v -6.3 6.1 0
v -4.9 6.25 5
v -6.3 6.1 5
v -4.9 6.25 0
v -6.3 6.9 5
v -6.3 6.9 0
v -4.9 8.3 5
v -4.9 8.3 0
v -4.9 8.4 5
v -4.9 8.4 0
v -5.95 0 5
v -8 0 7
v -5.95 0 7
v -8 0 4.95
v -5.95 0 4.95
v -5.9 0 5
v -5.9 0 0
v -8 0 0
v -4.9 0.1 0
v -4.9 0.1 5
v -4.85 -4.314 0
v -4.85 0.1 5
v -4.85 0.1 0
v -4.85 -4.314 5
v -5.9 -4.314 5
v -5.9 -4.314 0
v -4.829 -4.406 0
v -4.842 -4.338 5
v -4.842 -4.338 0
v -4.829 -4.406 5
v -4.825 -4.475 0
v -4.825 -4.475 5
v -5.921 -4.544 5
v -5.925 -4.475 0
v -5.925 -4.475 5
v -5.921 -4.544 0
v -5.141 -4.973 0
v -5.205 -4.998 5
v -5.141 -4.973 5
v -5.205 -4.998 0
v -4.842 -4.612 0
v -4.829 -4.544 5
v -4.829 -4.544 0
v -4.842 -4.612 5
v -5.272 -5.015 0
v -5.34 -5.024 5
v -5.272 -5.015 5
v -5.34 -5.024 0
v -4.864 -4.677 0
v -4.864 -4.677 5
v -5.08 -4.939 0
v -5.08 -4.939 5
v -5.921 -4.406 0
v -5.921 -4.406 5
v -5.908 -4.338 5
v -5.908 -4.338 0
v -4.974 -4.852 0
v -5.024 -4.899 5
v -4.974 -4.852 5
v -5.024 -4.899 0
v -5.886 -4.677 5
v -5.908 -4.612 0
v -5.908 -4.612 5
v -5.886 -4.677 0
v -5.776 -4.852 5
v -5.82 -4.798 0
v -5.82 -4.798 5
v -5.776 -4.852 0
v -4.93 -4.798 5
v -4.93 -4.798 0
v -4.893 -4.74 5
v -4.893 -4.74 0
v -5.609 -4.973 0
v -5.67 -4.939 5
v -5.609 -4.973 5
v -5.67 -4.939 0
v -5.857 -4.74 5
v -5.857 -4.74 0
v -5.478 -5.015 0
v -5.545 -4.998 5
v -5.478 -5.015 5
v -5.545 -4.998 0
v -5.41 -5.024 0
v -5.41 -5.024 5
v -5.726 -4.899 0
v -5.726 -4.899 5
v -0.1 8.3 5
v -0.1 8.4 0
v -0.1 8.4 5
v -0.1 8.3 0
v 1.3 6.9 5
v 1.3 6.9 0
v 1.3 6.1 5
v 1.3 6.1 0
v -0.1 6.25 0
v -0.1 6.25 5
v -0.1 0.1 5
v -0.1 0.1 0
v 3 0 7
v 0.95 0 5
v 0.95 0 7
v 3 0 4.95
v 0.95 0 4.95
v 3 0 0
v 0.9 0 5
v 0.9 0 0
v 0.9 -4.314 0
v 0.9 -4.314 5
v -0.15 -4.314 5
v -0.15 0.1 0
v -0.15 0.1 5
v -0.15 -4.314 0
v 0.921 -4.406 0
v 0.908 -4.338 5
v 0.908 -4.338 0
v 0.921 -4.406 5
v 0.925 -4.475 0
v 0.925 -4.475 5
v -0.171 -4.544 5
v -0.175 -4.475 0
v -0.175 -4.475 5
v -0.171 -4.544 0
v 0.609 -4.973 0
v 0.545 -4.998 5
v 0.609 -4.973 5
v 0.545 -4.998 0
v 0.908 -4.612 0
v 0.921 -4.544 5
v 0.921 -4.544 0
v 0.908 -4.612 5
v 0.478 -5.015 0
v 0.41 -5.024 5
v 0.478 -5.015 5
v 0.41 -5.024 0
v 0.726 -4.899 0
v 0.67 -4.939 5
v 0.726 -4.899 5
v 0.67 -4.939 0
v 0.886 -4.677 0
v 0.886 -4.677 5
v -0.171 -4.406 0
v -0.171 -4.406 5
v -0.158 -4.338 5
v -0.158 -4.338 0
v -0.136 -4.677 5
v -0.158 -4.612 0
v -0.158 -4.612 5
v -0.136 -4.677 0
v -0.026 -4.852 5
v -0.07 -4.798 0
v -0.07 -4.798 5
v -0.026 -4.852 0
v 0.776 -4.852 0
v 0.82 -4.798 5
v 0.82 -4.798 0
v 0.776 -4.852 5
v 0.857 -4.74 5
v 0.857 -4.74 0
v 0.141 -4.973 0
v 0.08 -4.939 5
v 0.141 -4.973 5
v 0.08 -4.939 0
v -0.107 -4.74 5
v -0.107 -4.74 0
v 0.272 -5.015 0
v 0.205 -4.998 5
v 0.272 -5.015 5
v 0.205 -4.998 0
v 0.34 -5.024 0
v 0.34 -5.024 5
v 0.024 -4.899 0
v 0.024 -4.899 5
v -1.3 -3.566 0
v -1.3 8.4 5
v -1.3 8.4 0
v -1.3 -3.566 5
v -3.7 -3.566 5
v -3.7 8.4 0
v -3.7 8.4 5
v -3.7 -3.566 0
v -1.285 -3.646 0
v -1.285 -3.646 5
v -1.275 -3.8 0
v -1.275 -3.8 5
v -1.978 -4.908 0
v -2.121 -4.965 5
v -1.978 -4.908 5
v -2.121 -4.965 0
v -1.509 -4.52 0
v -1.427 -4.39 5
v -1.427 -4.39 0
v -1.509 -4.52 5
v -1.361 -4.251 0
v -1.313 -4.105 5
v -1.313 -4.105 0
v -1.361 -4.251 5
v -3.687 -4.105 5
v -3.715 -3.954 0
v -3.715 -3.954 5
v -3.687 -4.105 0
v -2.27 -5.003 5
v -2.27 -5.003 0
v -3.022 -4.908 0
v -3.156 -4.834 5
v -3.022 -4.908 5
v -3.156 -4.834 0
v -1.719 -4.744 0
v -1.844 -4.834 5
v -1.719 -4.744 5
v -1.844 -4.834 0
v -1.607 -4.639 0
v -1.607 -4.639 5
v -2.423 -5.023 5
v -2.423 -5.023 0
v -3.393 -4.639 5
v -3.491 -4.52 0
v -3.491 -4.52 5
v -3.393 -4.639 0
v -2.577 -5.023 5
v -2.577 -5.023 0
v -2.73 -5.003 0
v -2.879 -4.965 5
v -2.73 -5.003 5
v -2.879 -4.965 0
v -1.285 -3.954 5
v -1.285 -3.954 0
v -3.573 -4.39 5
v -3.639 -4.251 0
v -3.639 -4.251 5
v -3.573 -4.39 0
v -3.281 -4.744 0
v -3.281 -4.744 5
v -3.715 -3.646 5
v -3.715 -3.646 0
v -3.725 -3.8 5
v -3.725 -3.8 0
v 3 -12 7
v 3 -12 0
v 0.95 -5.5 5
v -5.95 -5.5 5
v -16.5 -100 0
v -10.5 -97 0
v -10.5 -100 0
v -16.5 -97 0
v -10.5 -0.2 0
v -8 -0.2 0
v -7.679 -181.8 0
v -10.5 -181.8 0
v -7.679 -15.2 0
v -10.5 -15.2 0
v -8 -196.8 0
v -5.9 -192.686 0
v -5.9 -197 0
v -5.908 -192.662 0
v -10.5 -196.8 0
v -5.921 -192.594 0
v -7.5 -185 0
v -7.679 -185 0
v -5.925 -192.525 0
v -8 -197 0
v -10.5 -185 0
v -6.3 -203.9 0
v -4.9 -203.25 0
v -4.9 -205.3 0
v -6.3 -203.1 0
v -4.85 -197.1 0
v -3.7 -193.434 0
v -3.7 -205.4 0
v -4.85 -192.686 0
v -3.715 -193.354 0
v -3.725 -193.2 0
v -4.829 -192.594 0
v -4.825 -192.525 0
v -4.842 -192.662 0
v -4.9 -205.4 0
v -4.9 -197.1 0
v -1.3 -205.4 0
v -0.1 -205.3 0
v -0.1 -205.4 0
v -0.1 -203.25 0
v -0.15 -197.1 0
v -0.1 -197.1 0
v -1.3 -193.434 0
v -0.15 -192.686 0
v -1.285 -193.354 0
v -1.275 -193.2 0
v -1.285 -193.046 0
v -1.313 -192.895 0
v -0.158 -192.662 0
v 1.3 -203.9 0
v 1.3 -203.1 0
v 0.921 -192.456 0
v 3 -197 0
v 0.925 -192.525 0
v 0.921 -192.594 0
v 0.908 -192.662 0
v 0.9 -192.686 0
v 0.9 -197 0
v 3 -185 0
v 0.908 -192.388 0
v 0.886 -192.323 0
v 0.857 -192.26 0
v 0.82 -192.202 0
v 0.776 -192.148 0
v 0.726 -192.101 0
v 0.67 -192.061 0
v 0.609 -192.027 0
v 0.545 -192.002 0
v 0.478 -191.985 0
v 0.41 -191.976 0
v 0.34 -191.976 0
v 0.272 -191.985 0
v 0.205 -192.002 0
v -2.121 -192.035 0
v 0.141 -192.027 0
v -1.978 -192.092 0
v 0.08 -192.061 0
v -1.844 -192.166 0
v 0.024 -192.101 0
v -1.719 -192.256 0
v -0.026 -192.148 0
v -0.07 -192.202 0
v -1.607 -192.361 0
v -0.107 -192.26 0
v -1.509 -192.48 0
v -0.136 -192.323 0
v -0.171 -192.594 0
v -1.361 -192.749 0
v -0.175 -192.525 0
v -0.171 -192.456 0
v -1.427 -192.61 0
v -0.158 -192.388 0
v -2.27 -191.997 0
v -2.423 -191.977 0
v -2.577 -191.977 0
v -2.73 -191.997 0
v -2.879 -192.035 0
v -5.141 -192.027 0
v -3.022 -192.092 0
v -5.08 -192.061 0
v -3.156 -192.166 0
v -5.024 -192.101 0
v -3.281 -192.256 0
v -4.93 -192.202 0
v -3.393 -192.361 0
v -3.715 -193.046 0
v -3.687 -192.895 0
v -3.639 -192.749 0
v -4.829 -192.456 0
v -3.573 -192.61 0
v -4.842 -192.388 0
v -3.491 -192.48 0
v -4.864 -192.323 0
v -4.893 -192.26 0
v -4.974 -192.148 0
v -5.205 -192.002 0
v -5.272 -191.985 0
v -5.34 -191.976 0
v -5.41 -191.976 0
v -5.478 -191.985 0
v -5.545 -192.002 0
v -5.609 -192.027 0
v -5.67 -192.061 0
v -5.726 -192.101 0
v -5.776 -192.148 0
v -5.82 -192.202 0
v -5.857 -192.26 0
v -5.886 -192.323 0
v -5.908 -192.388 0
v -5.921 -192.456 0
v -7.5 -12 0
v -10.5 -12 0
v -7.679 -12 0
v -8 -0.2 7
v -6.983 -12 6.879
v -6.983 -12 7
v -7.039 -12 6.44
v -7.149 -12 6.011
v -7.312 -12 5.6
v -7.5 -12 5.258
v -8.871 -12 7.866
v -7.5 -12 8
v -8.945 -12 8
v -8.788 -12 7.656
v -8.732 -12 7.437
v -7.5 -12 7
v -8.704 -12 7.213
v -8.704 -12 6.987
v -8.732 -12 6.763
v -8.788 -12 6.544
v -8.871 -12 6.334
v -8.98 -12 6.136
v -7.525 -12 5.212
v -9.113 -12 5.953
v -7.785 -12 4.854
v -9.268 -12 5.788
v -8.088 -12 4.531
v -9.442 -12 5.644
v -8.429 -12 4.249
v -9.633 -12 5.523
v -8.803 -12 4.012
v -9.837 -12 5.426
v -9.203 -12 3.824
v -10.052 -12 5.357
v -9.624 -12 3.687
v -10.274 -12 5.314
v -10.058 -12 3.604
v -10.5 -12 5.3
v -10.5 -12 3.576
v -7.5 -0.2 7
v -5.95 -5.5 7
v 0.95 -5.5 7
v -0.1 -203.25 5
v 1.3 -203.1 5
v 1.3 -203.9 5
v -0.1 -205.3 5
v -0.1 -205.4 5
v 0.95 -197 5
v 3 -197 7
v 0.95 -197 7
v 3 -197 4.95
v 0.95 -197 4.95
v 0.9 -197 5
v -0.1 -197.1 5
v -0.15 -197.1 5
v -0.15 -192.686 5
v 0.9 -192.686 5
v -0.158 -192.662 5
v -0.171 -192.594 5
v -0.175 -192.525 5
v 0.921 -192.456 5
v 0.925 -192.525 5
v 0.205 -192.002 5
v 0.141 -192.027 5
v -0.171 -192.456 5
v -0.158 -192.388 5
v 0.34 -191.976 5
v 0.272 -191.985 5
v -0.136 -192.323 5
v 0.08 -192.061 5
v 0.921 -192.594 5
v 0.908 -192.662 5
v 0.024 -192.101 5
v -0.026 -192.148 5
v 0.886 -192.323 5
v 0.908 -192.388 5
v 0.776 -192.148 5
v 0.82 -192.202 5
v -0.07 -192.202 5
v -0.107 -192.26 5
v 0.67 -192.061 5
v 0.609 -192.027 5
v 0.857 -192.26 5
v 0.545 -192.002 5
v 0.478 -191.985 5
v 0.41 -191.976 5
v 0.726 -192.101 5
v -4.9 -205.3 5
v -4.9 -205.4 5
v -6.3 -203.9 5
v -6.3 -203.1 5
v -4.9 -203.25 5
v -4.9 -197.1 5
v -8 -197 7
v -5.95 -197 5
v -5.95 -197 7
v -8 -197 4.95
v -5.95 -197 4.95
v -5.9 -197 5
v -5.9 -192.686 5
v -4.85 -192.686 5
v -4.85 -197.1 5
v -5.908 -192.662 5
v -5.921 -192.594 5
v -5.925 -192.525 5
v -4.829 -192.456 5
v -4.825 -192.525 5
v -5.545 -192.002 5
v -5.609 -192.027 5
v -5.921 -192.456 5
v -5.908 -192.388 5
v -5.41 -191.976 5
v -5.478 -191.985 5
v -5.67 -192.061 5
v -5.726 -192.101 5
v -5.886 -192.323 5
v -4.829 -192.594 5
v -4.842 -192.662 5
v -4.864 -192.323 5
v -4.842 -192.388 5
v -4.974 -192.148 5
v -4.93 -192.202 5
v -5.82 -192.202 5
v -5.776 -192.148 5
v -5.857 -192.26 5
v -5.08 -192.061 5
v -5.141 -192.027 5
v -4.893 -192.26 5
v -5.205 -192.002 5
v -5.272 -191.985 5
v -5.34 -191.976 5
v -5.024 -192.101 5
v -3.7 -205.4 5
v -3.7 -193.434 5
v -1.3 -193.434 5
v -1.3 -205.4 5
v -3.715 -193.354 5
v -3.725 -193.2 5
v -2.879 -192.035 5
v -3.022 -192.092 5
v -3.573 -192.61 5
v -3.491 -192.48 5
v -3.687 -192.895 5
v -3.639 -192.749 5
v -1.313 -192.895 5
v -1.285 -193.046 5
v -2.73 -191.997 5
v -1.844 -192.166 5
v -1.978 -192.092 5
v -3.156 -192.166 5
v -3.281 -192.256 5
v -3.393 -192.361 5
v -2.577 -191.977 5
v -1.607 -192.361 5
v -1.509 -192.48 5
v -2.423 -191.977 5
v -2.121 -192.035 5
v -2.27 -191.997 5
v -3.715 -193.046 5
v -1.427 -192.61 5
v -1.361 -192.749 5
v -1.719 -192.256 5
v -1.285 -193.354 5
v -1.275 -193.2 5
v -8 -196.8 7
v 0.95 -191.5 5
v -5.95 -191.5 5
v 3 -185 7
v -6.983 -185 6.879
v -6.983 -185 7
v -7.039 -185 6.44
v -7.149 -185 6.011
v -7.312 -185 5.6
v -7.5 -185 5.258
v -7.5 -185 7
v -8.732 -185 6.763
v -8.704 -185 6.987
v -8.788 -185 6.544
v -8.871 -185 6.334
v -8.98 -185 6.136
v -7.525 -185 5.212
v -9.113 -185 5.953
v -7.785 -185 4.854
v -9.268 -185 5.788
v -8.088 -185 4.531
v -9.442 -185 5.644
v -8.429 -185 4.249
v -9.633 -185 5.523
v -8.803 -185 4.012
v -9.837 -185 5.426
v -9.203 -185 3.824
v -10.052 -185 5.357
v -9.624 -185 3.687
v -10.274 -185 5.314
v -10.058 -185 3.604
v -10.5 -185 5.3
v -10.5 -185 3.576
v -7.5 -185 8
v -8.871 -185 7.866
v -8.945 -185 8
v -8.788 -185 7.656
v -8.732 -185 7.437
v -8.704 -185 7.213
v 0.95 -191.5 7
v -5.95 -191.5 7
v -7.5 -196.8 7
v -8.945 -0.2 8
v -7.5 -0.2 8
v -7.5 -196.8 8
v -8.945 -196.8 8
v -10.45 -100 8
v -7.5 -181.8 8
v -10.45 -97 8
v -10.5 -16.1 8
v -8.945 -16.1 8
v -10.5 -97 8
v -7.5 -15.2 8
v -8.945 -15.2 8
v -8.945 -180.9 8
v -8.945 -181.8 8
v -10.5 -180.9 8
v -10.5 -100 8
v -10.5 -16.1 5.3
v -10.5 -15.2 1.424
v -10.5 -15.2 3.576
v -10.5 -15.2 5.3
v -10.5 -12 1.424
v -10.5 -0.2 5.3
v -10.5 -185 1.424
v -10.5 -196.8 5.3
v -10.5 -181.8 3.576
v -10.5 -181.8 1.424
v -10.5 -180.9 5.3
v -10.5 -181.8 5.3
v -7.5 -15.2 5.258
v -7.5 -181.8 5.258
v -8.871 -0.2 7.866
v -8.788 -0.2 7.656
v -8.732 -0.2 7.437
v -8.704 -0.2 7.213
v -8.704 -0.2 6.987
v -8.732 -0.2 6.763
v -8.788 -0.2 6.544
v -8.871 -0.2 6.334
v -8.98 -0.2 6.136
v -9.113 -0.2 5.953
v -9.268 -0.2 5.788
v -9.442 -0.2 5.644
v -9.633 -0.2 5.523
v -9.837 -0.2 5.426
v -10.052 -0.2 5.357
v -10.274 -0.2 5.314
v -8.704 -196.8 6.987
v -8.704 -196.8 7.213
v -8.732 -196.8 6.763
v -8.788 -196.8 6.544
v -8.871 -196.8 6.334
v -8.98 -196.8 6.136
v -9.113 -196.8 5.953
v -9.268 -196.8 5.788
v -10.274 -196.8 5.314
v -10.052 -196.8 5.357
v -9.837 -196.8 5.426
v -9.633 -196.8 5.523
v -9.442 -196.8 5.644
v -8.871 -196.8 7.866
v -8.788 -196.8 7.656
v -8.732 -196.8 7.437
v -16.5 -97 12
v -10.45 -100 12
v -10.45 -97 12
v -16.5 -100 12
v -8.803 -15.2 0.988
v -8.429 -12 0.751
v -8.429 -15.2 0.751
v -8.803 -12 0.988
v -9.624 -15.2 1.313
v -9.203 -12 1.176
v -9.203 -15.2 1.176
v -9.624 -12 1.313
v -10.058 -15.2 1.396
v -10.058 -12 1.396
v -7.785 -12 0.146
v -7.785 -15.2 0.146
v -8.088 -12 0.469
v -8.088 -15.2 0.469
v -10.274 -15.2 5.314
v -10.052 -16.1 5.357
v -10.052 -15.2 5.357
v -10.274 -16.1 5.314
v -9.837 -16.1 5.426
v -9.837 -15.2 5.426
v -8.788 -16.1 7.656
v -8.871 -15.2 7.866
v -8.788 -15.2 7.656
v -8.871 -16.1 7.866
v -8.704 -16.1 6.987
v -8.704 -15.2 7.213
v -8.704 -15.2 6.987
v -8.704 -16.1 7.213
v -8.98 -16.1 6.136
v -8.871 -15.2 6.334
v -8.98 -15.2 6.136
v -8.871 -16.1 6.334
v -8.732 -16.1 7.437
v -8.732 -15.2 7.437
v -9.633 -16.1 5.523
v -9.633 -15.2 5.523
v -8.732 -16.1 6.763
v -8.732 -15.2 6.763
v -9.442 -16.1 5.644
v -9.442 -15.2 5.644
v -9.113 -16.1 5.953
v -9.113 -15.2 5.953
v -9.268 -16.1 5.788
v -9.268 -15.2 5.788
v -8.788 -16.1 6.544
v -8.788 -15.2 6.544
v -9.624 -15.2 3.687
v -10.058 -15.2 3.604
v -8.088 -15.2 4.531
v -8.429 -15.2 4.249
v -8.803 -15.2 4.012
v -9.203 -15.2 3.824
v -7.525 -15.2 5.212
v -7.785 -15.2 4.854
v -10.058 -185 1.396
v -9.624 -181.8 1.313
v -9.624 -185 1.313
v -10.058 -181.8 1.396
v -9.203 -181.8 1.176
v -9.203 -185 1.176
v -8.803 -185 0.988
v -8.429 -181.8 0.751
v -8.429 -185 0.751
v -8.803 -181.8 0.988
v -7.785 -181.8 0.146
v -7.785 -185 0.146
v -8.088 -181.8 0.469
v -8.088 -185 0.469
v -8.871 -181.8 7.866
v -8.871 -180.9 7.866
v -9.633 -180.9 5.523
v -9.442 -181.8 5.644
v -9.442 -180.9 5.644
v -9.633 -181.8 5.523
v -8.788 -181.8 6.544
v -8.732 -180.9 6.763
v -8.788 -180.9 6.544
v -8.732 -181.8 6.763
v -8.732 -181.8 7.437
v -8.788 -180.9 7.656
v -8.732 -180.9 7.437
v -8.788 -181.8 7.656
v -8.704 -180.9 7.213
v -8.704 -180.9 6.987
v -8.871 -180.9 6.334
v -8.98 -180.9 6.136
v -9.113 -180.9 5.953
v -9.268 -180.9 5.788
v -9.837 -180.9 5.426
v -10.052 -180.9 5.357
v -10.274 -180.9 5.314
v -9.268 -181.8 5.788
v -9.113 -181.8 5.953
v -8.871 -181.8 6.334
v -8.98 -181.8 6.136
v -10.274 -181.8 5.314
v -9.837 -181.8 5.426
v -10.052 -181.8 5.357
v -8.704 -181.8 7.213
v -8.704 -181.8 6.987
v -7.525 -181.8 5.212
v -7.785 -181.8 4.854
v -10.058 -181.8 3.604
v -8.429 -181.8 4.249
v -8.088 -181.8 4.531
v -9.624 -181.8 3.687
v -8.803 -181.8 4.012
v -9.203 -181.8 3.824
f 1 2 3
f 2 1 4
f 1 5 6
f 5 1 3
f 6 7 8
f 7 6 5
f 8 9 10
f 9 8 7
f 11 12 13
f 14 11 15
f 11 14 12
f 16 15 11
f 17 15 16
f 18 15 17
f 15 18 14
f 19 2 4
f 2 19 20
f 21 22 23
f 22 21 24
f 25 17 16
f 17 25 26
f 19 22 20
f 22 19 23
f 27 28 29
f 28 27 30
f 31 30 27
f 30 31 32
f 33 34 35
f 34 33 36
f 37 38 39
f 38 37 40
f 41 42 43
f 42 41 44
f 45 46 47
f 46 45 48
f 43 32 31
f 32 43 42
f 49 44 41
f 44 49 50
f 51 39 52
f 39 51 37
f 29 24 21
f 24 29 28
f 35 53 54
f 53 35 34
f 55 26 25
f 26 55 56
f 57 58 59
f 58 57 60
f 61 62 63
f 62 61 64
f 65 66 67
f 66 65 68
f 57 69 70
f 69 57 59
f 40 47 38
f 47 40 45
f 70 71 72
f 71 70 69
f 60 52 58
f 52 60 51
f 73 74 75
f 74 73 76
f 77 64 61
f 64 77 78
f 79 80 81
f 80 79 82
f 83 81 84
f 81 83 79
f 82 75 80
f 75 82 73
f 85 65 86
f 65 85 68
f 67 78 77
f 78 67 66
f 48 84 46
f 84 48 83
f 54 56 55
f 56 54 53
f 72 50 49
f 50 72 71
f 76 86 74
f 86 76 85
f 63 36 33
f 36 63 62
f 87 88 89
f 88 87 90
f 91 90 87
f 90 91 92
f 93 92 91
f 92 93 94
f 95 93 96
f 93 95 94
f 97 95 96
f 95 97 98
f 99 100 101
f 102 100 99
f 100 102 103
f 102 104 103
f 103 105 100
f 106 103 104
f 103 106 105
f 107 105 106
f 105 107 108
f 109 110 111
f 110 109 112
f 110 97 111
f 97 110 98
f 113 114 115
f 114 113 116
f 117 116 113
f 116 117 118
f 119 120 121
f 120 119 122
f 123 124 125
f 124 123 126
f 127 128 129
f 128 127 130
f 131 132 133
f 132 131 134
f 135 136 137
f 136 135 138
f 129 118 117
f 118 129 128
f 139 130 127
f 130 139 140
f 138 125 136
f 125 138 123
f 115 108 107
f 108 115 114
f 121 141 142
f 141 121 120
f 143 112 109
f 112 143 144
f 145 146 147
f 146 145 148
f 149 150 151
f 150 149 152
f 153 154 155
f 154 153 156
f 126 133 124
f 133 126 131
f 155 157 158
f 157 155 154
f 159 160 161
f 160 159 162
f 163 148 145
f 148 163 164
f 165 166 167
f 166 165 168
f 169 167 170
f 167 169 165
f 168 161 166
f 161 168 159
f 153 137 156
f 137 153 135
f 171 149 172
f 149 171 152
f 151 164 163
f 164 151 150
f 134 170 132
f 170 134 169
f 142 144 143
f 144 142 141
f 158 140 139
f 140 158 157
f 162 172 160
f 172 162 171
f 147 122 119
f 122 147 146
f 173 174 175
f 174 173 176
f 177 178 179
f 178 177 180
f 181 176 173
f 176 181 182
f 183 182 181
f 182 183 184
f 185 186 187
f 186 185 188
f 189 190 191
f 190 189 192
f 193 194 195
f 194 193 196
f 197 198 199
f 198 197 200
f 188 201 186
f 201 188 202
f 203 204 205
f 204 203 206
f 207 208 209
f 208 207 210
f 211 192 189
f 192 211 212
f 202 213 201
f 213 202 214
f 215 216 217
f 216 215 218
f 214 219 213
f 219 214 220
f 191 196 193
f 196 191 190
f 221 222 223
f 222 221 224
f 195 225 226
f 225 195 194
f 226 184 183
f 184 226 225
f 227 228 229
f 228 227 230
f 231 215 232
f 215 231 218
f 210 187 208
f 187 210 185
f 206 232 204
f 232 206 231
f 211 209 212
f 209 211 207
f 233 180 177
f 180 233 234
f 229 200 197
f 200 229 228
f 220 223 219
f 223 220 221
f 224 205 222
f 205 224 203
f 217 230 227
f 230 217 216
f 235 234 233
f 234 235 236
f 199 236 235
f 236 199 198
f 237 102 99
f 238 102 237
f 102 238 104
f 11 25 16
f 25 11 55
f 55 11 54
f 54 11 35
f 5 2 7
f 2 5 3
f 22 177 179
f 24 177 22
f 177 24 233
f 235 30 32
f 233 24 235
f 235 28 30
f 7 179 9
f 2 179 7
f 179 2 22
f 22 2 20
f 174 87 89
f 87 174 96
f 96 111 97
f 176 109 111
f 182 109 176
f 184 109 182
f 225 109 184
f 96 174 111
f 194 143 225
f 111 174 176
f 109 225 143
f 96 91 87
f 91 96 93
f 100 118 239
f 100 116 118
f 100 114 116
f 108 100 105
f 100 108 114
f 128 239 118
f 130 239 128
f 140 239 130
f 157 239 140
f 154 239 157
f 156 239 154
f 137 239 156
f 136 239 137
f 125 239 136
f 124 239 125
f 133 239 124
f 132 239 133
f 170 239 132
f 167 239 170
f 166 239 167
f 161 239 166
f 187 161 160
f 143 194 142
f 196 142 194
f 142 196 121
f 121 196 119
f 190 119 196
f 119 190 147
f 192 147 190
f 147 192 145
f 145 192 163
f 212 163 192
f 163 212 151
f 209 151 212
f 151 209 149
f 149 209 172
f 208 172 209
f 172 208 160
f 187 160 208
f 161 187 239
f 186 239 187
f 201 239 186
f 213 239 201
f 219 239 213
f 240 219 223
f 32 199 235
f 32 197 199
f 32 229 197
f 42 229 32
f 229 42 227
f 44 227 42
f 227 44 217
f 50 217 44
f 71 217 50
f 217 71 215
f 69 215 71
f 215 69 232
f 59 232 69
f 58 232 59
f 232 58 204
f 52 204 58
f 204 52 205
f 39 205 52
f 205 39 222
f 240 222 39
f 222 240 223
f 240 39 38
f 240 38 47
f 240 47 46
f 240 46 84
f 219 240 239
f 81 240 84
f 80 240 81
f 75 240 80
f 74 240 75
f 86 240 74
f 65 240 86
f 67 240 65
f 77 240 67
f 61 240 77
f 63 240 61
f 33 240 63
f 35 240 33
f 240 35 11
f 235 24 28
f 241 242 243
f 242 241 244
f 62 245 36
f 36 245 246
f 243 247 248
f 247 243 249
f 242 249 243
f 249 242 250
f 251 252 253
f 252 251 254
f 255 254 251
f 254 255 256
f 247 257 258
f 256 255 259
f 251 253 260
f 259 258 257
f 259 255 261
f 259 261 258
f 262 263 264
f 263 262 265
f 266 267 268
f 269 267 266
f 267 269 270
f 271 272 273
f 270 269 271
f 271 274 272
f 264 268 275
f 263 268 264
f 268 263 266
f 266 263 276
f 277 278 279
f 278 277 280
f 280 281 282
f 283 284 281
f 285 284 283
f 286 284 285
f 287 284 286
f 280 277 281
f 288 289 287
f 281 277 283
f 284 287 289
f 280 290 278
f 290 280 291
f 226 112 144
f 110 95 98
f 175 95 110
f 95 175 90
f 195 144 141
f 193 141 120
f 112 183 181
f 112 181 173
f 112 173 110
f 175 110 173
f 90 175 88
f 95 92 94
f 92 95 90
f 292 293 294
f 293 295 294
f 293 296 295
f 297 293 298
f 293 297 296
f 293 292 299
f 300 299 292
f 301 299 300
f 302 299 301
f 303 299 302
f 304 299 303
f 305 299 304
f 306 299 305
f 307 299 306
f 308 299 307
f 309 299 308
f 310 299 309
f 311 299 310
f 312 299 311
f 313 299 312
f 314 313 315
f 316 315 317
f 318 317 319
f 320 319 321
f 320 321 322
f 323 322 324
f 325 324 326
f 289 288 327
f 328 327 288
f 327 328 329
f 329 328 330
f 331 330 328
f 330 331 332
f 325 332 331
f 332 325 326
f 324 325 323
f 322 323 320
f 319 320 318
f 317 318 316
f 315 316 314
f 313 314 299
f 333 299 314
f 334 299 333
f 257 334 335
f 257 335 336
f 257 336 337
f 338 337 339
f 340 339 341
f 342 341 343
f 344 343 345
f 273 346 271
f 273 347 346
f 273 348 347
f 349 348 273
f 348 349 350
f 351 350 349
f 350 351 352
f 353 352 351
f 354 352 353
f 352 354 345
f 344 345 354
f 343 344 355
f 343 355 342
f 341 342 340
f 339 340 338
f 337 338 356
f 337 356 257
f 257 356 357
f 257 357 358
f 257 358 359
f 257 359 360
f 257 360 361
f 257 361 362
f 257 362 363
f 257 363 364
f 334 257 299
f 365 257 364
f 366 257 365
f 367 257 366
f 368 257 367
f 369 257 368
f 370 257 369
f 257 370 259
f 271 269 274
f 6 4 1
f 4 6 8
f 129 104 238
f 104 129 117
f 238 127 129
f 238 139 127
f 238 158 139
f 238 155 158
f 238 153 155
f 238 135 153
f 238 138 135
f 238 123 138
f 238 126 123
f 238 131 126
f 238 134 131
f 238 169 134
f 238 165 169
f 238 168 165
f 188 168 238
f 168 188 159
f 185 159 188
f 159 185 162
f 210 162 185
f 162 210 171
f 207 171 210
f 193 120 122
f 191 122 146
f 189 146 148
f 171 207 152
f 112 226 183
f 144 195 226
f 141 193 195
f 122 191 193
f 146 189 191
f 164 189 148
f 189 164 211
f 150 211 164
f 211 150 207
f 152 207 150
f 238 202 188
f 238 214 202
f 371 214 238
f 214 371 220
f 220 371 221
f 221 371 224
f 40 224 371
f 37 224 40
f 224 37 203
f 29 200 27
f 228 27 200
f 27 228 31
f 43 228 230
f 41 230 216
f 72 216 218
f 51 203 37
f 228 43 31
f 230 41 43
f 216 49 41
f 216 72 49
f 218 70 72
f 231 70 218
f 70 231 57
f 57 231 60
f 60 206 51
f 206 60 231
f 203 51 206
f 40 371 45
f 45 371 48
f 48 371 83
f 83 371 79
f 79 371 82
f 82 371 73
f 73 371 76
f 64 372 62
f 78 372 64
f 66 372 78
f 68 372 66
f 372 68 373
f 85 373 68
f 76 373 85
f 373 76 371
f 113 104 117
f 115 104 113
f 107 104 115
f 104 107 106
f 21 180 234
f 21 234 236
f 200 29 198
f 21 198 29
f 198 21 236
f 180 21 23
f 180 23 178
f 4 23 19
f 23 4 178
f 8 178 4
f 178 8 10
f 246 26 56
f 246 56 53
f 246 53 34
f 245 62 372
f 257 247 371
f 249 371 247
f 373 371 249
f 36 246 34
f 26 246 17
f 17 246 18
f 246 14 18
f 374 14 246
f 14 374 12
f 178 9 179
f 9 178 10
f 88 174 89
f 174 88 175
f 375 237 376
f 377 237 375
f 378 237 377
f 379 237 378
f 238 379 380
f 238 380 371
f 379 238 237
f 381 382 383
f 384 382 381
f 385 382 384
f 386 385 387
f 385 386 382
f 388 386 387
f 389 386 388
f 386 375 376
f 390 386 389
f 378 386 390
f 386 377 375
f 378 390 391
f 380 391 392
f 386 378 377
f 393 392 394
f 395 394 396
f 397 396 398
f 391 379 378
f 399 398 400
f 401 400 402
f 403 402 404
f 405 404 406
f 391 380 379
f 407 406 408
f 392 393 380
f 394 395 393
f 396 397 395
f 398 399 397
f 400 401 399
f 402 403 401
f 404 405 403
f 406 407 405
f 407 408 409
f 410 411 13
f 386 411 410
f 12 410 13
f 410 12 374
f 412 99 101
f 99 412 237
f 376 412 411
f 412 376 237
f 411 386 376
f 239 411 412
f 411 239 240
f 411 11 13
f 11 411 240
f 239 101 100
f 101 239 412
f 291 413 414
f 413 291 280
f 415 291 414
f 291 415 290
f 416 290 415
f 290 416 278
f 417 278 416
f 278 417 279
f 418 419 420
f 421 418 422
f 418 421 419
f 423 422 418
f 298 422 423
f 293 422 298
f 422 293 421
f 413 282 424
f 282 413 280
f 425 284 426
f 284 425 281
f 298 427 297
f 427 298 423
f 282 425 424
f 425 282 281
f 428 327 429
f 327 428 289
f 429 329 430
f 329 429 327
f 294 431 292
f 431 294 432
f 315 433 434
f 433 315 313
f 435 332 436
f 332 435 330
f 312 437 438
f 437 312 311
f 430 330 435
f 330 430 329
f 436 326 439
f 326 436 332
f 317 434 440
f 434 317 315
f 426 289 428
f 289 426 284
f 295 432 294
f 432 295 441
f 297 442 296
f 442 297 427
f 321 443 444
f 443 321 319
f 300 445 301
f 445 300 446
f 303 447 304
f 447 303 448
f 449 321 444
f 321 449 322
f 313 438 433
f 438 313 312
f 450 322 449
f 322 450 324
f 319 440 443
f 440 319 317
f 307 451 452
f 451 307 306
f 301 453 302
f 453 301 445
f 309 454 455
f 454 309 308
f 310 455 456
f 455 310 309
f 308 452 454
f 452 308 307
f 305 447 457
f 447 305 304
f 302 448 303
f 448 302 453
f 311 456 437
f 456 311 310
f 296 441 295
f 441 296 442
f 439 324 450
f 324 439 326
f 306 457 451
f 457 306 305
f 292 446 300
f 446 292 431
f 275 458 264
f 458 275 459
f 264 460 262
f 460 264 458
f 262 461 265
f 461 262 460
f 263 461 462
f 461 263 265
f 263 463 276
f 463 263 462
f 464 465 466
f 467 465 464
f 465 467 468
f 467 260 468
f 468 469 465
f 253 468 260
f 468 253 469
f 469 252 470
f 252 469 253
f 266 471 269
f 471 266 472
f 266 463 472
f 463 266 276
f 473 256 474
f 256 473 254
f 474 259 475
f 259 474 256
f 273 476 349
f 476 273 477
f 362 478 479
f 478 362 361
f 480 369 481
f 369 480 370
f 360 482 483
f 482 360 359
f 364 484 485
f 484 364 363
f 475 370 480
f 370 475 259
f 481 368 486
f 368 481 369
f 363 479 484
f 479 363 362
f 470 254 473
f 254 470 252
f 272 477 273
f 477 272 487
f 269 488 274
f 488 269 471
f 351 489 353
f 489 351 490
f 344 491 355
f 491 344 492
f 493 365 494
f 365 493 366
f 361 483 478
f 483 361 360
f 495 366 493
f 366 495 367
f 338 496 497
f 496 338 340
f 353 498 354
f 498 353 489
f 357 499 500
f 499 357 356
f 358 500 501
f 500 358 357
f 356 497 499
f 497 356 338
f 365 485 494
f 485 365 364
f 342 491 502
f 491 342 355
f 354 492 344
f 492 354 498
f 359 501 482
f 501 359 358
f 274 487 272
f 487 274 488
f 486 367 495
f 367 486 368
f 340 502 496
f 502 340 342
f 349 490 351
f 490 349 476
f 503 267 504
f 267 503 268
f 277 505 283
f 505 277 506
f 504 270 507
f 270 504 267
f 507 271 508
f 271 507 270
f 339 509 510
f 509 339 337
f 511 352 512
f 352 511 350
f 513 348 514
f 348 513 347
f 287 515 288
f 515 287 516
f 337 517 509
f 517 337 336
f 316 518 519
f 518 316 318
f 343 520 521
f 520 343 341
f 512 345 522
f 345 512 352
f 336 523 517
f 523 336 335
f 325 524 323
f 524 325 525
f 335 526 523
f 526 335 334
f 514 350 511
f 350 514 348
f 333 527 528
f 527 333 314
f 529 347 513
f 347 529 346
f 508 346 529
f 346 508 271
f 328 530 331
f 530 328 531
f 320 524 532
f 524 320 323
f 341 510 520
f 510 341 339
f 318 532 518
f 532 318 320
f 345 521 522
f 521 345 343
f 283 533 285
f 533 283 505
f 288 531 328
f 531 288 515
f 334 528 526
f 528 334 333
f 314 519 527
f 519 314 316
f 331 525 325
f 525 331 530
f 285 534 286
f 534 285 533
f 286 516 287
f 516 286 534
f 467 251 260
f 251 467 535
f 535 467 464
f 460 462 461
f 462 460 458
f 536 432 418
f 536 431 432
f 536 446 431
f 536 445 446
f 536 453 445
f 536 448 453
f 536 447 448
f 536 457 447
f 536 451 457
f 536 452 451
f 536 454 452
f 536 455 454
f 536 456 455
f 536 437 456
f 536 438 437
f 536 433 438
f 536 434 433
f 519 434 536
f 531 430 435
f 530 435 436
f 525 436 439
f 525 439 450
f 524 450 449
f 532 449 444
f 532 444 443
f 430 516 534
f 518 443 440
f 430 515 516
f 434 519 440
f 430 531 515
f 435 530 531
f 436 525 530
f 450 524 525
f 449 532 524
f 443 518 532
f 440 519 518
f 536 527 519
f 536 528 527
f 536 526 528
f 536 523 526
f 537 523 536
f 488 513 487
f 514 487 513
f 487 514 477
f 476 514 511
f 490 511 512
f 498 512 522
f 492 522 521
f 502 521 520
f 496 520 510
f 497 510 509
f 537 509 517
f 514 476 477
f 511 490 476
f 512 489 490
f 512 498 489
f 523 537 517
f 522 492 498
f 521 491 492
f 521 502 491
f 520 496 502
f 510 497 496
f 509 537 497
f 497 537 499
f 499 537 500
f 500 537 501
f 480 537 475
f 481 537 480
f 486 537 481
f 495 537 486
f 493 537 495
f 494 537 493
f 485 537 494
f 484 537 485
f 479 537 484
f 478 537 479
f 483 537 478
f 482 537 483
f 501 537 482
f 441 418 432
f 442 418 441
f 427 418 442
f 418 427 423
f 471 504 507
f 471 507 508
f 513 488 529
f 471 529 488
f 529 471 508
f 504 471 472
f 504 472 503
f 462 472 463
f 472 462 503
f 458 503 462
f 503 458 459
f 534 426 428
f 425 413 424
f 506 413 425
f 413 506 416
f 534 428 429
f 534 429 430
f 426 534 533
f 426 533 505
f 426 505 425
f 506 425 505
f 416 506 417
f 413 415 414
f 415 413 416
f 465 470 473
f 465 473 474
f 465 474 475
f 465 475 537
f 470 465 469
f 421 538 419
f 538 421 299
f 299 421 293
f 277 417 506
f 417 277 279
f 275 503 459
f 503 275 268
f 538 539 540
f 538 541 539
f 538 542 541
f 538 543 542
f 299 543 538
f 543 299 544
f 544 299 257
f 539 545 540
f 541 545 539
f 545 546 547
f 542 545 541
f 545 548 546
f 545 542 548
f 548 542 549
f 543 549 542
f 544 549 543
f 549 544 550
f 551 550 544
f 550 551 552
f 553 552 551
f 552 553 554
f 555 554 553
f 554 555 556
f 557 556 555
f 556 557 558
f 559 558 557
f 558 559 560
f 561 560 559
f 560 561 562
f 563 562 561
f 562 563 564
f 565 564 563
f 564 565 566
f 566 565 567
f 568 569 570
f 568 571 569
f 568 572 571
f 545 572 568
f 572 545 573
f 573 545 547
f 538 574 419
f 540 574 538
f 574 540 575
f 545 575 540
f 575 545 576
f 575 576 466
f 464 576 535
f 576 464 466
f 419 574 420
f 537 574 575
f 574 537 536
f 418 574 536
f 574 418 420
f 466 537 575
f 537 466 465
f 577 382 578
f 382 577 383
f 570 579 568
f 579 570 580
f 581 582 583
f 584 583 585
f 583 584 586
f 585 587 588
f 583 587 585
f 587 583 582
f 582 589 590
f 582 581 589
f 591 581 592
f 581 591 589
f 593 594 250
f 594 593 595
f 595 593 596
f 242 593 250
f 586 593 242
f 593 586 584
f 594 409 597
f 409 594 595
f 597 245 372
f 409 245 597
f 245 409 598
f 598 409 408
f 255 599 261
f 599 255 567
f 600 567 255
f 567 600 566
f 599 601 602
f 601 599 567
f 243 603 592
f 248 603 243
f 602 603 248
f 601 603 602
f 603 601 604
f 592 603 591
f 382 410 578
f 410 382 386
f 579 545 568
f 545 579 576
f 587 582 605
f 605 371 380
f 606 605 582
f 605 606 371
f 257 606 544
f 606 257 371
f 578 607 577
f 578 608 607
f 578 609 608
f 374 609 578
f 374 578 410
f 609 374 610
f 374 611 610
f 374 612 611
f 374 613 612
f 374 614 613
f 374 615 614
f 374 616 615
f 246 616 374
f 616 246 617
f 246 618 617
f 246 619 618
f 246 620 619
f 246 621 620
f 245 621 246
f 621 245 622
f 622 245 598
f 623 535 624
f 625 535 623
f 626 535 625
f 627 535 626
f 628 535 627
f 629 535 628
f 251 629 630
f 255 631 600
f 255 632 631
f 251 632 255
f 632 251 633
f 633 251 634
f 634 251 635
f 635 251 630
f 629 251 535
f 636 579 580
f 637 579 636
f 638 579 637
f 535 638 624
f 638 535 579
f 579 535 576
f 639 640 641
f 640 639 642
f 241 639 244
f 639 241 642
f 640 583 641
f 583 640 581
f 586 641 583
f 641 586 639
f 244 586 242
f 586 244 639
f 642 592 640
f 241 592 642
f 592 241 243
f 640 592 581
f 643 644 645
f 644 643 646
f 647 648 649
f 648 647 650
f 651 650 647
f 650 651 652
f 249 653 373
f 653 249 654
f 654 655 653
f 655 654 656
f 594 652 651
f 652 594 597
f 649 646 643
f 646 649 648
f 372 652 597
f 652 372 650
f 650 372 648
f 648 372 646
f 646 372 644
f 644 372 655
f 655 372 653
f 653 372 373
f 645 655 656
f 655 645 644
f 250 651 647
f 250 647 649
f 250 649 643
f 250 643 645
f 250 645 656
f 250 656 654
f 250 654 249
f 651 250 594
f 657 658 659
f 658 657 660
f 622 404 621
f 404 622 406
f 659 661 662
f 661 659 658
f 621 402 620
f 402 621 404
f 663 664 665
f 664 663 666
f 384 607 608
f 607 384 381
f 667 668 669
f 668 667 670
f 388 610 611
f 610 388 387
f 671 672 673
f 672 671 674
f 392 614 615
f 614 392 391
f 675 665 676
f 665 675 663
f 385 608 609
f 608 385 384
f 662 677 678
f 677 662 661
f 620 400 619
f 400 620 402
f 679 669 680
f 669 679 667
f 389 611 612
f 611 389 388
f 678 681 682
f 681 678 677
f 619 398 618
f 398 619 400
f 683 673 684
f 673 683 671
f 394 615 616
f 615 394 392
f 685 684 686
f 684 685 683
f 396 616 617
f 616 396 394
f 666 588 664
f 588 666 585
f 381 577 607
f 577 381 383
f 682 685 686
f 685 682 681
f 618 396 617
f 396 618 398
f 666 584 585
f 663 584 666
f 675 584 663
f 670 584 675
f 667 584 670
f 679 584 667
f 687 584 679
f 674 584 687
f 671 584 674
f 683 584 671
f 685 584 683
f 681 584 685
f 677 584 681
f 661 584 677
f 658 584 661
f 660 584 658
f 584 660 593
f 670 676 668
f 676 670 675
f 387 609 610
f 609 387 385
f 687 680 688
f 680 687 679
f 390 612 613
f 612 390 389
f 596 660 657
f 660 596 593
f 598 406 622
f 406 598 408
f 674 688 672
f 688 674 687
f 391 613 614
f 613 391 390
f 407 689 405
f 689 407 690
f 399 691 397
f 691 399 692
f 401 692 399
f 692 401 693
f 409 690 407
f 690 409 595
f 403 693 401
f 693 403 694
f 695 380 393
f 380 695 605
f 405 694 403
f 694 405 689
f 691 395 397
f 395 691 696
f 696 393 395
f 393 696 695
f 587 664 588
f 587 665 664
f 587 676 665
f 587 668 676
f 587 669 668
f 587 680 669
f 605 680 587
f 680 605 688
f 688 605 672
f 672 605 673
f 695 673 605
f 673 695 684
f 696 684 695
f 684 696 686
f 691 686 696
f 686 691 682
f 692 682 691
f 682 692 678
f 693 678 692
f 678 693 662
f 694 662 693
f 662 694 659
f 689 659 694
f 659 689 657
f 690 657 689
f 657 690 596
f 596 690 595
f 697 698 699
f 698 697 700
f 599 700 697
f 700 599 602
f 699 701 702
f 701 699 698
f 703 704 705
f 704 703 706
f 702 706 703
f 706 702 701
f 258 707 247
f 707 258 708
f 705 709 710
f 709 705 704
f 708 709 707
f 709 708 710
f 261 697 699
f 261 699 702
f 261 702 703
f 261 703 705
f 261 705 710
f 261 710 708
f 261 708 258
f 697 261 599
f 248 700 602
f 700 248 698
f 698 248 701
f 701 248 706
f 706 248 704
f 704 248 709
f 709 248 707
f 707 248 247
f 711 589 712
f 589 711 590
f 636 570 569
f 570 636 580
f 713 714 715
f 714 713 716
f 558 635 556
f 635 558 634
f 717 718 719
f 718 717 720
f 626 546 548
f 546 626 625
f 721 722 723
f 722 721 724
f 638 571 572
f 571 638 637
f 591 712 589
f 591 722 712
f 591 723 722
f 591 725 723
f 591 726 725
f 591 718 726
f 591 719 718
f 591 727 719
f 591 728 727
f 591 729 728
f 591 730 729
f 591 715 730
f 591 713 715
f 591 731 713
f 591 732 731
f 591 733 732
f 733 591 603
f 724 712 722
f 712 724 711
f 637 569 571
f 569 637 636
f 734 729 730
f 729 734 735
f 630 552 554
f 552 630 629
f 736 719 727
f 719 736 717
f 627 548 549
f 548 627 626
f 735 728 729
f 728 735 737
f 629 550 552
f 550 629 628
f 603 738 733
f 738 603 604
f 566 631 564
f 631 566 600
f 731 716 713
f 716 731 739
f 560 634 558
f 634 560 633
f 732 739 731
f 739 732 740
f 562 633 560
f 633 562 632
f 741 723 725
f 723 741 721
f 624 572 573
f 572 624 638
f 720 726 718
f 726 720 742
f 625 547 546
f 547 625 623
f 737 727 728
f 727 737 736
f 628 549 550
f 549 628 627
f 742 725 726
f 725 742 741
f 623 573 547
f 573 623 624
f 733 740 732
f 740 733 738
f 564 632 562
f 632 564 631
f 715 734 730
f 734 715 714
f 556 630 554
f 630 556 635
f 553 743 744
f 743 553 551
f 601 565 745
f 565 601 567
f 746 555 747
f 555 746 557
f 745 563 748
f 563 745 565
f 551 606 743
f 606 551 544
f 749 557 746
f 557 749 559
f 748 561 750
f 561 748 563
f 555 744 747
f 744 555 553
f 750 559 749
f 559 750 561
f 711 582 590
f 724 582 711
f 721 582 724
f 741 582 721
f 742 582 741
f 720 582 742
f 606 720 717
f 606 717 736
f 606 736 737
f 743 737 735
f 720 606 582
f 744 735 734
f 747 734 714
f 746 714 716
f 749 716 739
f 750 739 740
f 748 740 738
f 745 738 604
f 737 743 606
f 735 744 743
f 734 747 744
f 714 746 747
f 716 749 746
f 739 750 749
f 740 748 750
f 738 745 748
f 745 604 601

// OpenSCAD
$fn = 50;

difference() {
	union() {
		translate(v = [0, 0, 0]) {
			rotate(a = [0, 0, 0]) {
				difference() {
					union() {
						translate(v = [0, 0, 2.5]) {
							rotate(a = [0, -90, 0]) {
								difference() {
									union() {
										translate(v = [0, 0, 0]) {
											rotate(a = [0, 0, 0]) {
												difference() {
													union() {
														translate(v = [-2.5, 0, 2.5]) {
															rotate(a = [0, 90.0, 0]) {
																difference() {
																	union() {
																		translate(v = [0, 0, 0]) {
																			rotate(a = [0, 0, 0]) {
																				difference() {
																					union() {
																						translate(v = [0, 0, 0]) {
																							rotate(a = [0, 0, 0]) {
																								difference() {
																									union() {
																										translate(v = [-5.5, -12.0, 0]) {
																											cube(size = [11.0, 20.4, 5.0]);
																										}
																									}
																									union() {
																										translate(v = [0, 0, -0.1]) {
																											linear_extrude(height = 5.2) {
																												polygon(points = [[-2.4, 0], [-2.4, 6.25], [-3.8, 6.1], [-3.8, 6.8999999999999995], [-2.4, 8.299999999999999], [-2.4, 9.399999999999999], [-5.7, 9.399999999999999], [-5.7, 0]]);
																											}
																										}
																										translate(v = [0, 0, -0.1]) {
																											linear_extrude(height = 5.2) {
																												polygon(points = [[-2.35, -4.5], [-2.35, -4.3875], [-2.35, -4.275], [-2.35, -4.1625], [-2.35, -4.05], [-2.35, -3.9375], [-2.35, -3.825], [-2.35, -3.7125], [-2.35, -3.6], [-2.35, -3.4875], [-2.35, -3.375], [-2.35, -3.2625], [-2.35, -3.15], [-2.35, -3.0375], [-2.35, -2.925], [-2.35, -2.8125], [-2.35, -2.7], [-2.35, -2.5875], [-2.35, -2.475], [-2.35, -2.3625], [-2.35, -2.25], [-2.35, -2.1375], [-2.35, -2.025], [-2.35, -1.9125], [-2.35, -1.7999999999999998], [-2.35, -1.6875], [-2.35, -1.5750000000000002], [-2.35, -1.4625], [-2.35, -1.35], [-2.35, -1.2374999999999998], [-2.35, -1.125], [-2.35, -1.0125000000000002], [-2.35, -0.8999999999999999], [-2.35, -0.7875000000000001], [-2.35, -0.6749999999999998], [-2.35, -0.5625], [-2.35, -0.4500000000000002], [-2.35, -0.33750000000000036], [-2.35, -0.22499999999999964], [-2.35, -0.11249999999999982], [-2.35, 0.0], [-2.35, 0.1], [-3.4, 0.1], [-3.4, -4.5]]);
																											}
																										}
																										translate(v = [-2.875, -4.475, -0.1]) {
																											cylinder(h = 5.2, r = 0.55);
																										}
																										translate(v = [0, 0, -0.1]) {
																											linear_extrude(height = 5.2) {
																												polygon(points = [[2.4, 0], [2.4, 6.25], [3.8, 6.1], [3.8, 6.8999999999999995], [2.4, 8.299999999999999], [2.4, 9.399999999999999], [5.7, 9.399999999999999], [5.7, 0]]);
																											}
																										}
																										translate(v = [0, 0, -0.1]) {
																											linear_extrude(height = 5.2) {
																												polygon(points = [[2.35, -4.5], [2.35, -4.3875], [2.35, -4.275], [2.35, -4.1625], [2.35, -4.05], [2.35, -3.9375], [2.35, -3.825], [2.35, -3.7125], [2.35, -3.6], [2.35, -3.4875], [2.35, -3.375], [2.35, -3.2625], [2.35, -3.15], [2.35, -3.0375], [2.35, -2.925], [2.35, -2.8125], [2.35, -2.7], [2.35, -2.5875], [2.35, -2.475], [2.35, -2.3625], [2.35, -2.25], [2.35, -2.1375], [2.35, -2.025], [2.35, -1.9125], [2.35, -1.7999999999999998], [2.35, -1.6875], [2.35, -1.5750000000000002], [2.35, -1.4625], [2.35, -1.35], [2.35, -1.2374999999999998], [2.35, -1.125], [2.35, -1.0125000000000002], [2.35, -0.8999999999999999], [2.35, -0.7875000000000001], [2.35, -0.6749999999999998], [2.35, -0.5625], [2.35, -0.4500000000000002], [2.35, -0.33750000000000036], [2.35, -0.22499999999999964], [2.35, -0.11249999999999982], [2.35, 0.0], [2.35, 0.1], [3.4, 0.1], [3.4, -4.5]]);
																											}
																										}
																										translate(v = [2.875, -4.475, -0.1]) {
																											cylinder(h = 5.2, r = 0.55);
																										}
																										translate(v = [0, 0, -0.1]) {
																											linear_extrude(height = 5.2) {
																												polygon(points = [[-1.2, -3.8499999999999996], [-1.2, -3.6607142857142856], [-1.2, -3.471428571428571], [-1.2, -3.2821428571428566], [-1.2, -3.0928571428571425], [-1.2, -2.9035714285714285], [-1.2, -2.714285714285714], [-1.2, -2.5249999999999995], [-1.2, -2.3357142857142854], [-1.2, -2.1464285714285714], [-1.2, -1.9571428571428569], [-1.2, -1.7678571428571423], [-1.2, -1.5785714285714283], [-1.2, -1.3892857142857138], [-1.2, -1.1999999999999997], [-1.2, -1.0107142857142852], [-1.2, -0.8214285714285712], [-1.2, -0.6321428571428567], [-1.2, -0.4428571428571426], [-1.2, -0.2535714285714281], [-1.2, -0.06428571428571406], [-1.2, 0], [-1.2, 0.12500000000000044], [-1.2, 0.31428571428571495], [-1.2, 0.503571428571429], [-1.2, 0.6928571428571431], [-1.2, 0.8821428571428571], [-1.2, 1.071428571428572], [-1.2, 1.2607142857142861], [-1.2, 1.4500000000000002], [-1.2, 1.6392857142857142], [-1.2, 1.8285714285714292], [-1.2, 2.0178571428571432], [-1.2, 2.2071428571428573], [-1.2, 2.3964285714285714], [-1.2, 2.5857142857142863], [-1.2, 2.7750000000000004], [-1.2, 2.9642857142857144], [-1.2, 3.1535714285714294], [-1.2, 3.3428571428571434], [-1.2, 3.5321428571428575], [-1.2, 3.7214285714285715], [-1.2, 3.9107142857142865], [-1.2, 4.1000000000000005], [-1.2, 4.289285714285715], [-1.2, 4.4785714285714295], [-1.2, 4.667857142857143], [-1.2, 4.857142857142858], [-1.2, 5.046428571428573], [-1.2, 5.235714285714286], [-1.2, 5.425000000000001], [-1.2, 5.614285714285714], [-1.2, 5.803571428571429], [-1.2, 5.992857142857144], [-1.2, 6.1], [-1.2, 6.182142857142857], [-1.2, 6.25], [-1.2, 6.371428571428572], [-1.2, 6.560714285714287], [-1.2, 6.75], [-1.2, 6.939285714285715], [-1.2, 7.128571428571428], [-1.2, 7.317857142857143], [-1.2, 7.507142857142858], [-1.2, 7.696428571428571], [-1.2, 7.885714285714286], [-1.2, 8.075000000000001], [-1.2, 8.264285714285714], [-1.2, 8.45357142857143], [-1.2, 8.642857142857142], [-1.2, 8.832142857142857], [-1.2, 9.021428571428572], [-1.2, 9.210714285714285], [-1.2, 9.4], [1.2, 9.4], [1.2, 9.210714285714285], [1.2, 9.021428571428572], [1.2, 8.832142857142857], [1.2, 8.642857142857142], [1.2, 8.45357142857143], [1.2, 8.264285714285714], [1.2, 8.075000000000001], [1.2, 7.885714285714286], [1.2, 7.696428571428571], [1.2, 7.507142857142858], [1.2, 7.317857142857143], [1.2, 7.128571428571428], [1.2, 6.939285714285715], [1.2, 6.75], [1.2, 6.560714285714287], [1.2, 6.371428571428572], [1.2, 6.25], [1.2, 6.182142857142857], [1.2, 6.1], [1.2, 5.992857142857144], [1.2, 5.803571428571429], [1.2, 5.614285714285714], [1.2, 5.425000000000001], [1.2, 5.235714285714286], [1.2, 5.046428571428573], [1.2, 4.857142857142858], [1.2, 4.667857142857143], [1.2, 4.4785714285714295], [1.2, 4.289285714285715], [1.2, 4.1000000000000005], [1.2, 3.9107142857142865], [1.2, 3.7214285714285715], [1.2, 3.5321428571428575], [1.2, 3.3428571428571434], [1.2, 3.1535714285714294], [1.2, 2.9642857142857144], [1.2, 2.7750000000000004], [1.2, 2.5857142857142863], [1.2, 2.3964285714285714], [1.2, 2.2071428571428573], [1.2, 2.0178571428571432], [1.2, 1.8285714285714292], [1.2, 1.6392857142857142], [1.2, 1.4500000000000002], [1.2, 1.2607142857142861], [1.2, 1.071428571428572], [1.2, 0.8821428571428571], [1.2, 0.6928571428571431], [1.2, 0.503571428571429], [1.2, 0.31428571428571495], [1.2, 0.12500000000000044], [1.2, 0], [1.2, -0.06428571428571406], [1.2, -0.2535714285714281], [1.2, -0.4428571428571426], [1.2, -0.6321428571428567], [1.2, -0.8214285714285712], [1.2, -1.0107142857142852], [1.2, -1.1999999999999997], [1.2, -1.3892857142857138], [1.2, -1.5785714285714283], [1.2, -1.7678571428571423], [1.2, -1.9571428571428569], [1.2, -2.1464285714285714], [1.2, -2.3357142857142854], [1.2, -2.5249999999999995], [1.2, -2.714285714285714], [1.2, -2.9035714285714285], [1.2, -3.0928571428571425], [1.2, -3.2821428571428566], [1.2, -3.471428571428571], [1.2, -3.6607142857142856], [1.2, -3.8499999999999996]]);
																											}
																										}
																										translate(v = [0, -3.8, -0.1]) {
																											cylinder(h = 5.2, r = 1.2249999999999999);
																										}
																									}
																								}
																							}
																						}
																						translate(v = [0, 0, 0]) {
																							rotate(a = [0, 0, 0]) {
																								difference() {
																									union() {
																										translate(v = [-5.5, -12.0, 4.95]) {
																											cube(size = [11.0, 6.5, 2.05]);
																										}
																									}
																									union();
																								}
																							}
																						}
																						translate(v = [-5.5, -12.0, 4.95]) {
																							cube(size = [2.0500000000000003, 12.0, 2.05]);
																						}
																						translate(v = [3.4499999999999997, -12.0, 4.95]) {
																							cube(size = [2.0500000000000003, 12.0, 2.05]);
																						}
																					}
																					union();
																				}
																			}
																		}
																	}
																	union();
																}
															}
														}
													}
													union();
												}
											}
										}
										translate(v = [-2.5, -197.0, 2.5]) {
											rotate(a = [180, -90, 0]) {
												difference() {
													union() {
														translate(v = [0, 0, 0]) {
															rotate(a = [0, 0, 0]) {
																difference() {
																	union() {
																		translate(v = [0, 0, 0]) {
																			rotate(a = [0, 0, 0]) {
																				difference() {
																					union() {
																						translate(v = [-5.5, -12.0, 0]) {
																							cube(size = [11.0, 20.4, 5.0]);
																						}
																					}
																					union() {
																						translate(v = [0, 0, -0.1]) {
																							linear_extrude(height = 5.2) {
																								polygon(points = [[-2.4, 0], [-2.4, 6.25], [-3.8, 6.1], [-3.8, 6.8999999999999995], [-2.4, 8.299999999999999], [-2.4, 9.399999999999999], [-5.7, 9.399999999999999], [-5.7, 0]]);
																							}
																						}
																						translate(v = [0, 0, -0.1]) {
																							linear_extrude(height = 5.2) {
																								polygon(points = [[-2.35, -4.5], [-2.35, -4.3875], [-2.35, -4.275], [-2.35, -4.1625], [-2.35, -4.05], [-2.35, -3.9375], [-2.35, -3.825], [-2.35, -3.7125], [-2.35, -3.6], [-2.35, -3.4875], [-2.35, -3.375], [-2.35, -3.2625], [-2.35, -3.15], [-2.35, -3.0375], [-2.35, -2.925], [-2.35, -2.8125], [-2.35, -2.7], [-2.35, -2.5875], [-2.35, -2.475], [-2.35, -2.3625], [-2.35, -2.25], [-2.35, -2.1375], [-2.35, -2.025], [-2.35, -1.9125], [-2.35, -1.7999999999999998], [-2.35, -1.6875], [-2.35, -1.5750000000000002], [-2.35, -1.4625], [-2.35, -1.35], [-2.35, -1.2374999999999998], [-2.35, -1.125], [-2.35, -1.0125000000000002], [-2.35, -0.8999999999999999], [-2.35, -0.7875000000000001], [-2.35, -0.6749999999999998], [-2.35, -0.5625], [-2.35, -0.4500000000000002], [-2.35, -0.33750000000000036], [-2.35, -0.22499999999999964], [-2.35, -0.11249999999999982], [-2.35, 0.0], [-2.35, 0.1], [-3.4, 0.1], [-3.4, -4.5]]);
																							}
																						}
																						translate(v = [-2.875, -4.475, -0.1]) {
																							cylinder(h = 5.2, r = 0.55);
																						}
																						translate(v = [0, 0, -0.1]) {
																							linear_extrude(height = 5.2) {
																								polygon(points = [[2.4, 0], [2.4, 6.25], [3.8, 6.1], [3.8, 6.8999999999999995], [2.4, 8.299999999999999], [2.4, 9.399999999999999], [5.7, 9.399999999999999], [5.7, 0]]);
																							}
																						}
																						translate(v = [0, 0, -0.1]) {
																							linear_extrude(height = 5.2) {
																								polygon(points = [[2.35, -4.5], [2.35, -4.3875], [2.35, -4.275], [2.35, -4.1625], [2.35, -4.05], [2.35, -3.9375], [2.35, -3.825], [2.35, -3.7125], [2.35, -3.6], [2.35, -3.4875], [2.35, -3.375], [2.35, -3.2625], [2.35, -3.15], [2.35, -3.0375], [2.35, -2.925], [2.35, -2.8125], [2.35, -2.7], [2.35, -2.5875], [2.35, -2.475], [2.35, -2.3625], [2.35, -2.25], [2.35, -2.1375], [2.35, -2.025], [2.35, -1.9125], [2.35, -1.7999999999999998], [2.35, -1.6875], [2.35, -1.5750000000000002], [2.35, -1.4625], [2.35, -1.35], [2.35, -1.2374999999999998], [2.35, -1.125], [2.35, -1.0125000000000002], [2.35, -0.8999999999999999], [2.35, -0.7875000000000001], [2.35, -0.6749999999999998], [2.35, -0.5625], [2.35, -0.4500000000000002], [2.35, -0.33750000000000036], [2.35, -0.22499999999999964], [2.35, -0.11249999999999982], [2.35, 0.0], [2.35, 0.1], [3.4, 0.1], [3.4, -4.5]]);
																							}
																						}
																						translate(v = [2.875, -4.475, -0.1]) {
																							cylinder(h = 5.2, r = 0.55);
																						}
																						translate(v = [0, 0, -0.1]) {
																							linear_extrude(height = 5.2) {
																								polygon(points = [[-1.2, -3.8499999999999996], [-1.2, -3.6607142857142856], [-1.2, -3.471428571428571], [-1.2, -3.2821428571428566], [-1.2, -3.0928571428571425], [-1.2, -2.9035714285714285], [-1.2, -2.714285714285714], [-1.2, -2.5249999999999995], [-1.2, -2.3357142857142854], [-1.2, -2.1464285714285714], [-1.2, -1.9571428571428569], [-1.2, -1.7678571428571423], [-1.2, -1.5785714285714283], [-1.2, -1.3892857142857138], [-1.2, -1.1999999999999997], [-1.2, -1.0107142857142852], [-1.2, -0.8214285714285712], [-1.2, -0.6321428571428567], [-1.2, -0.4428571428571426], [-1.2, -0.2535714285714281], [-1.2, -0.06428571428571406], [-1.2, 0], [-1.2, 0.12500000000000044], [-1.2, 0.31428571428571495], [-1.2, 0.503571428571429], [-1.2, 0.6928571428571431], [-1.2, 0.8821428571428571], [-1.2, 1.071428571428572], [-1.2, 1.2607142857142861], [-1.2, 1.4500000000000002], [-1.2, 1.6392857142857142], [-1.2, 1.8285714285714292], [-1.2, 2.0178571428571432], [-1.2, 2.2071428571428573], [-1.2, 2.3964285714285714], [-1.2, 2.5857142857142863], [-1.2, 2.7750000000000004], [-1.2, 2.9642857142857144], [-1.2, 3.1535714285714294], [-1.2, 3.3428571428571434], [-1.2, 3.5321428571428575], [-1.2, 3.7214285714285715], [-1.2, 3.9107142857142865], [-1.2, 4.1000000000000005], [-1.2, 4.289285714285715], [-1.2, 4.4785714285714295], [-1.2, 4.667857142857143], [-1.2, 4.857142857142858], [-1.2, 5.046428571428573], [-1.2, 5.235714285714286], [-1.2, 5.425000000000001], [-1.2, 5.614285714285714], [-1.2, 5.803571428571429], [-1.2, 5.992857142857144], [-1.2, 6.1], [-1.2, 6.182142857142857], [-1.2, 6.25], [-1.2, 6.371428571428572], [-1.2, 6.560714285714287], [-1.2, 6.75], [-1.2, 6.939285714285715], [-1.2, 7.128571428571428], [-1.2, 7.317857142857143], [-1.2, 7.507142857142858], [-1.2, 7.696428571428571], [-1.2, 7.885714285714286], [-1.2, 8.075000000000001], [-1.2, 8.264285714285714], [-1.2, 8.45357142857143], [-1.2, 8.642857142857142], [-1.2, 8.832142857142857], [-1.2, 9.021428571428572], [-1.2, 9.210714285714285], [-1.2, 9.4], [1.2, 9.4], [1.2, 9.210714285714285], [1.2, 9.021428571428572], [1.2, 8.832142857142857], [1.2, 8.642857142857142], [1.2, 8.45357142857143], [1.2, 8.264285714285714], [1.2, 8.075000000000001], [1.2, 7.885714285714286], [1.2, 7.696428571428571], [1.2, 7.507142857142858], [1.2, 7.317857142857143], [1.2, 7.128571428571428], [1.2, 6.939285714285715], [1.2, 6.75], [1.2, 6.560714285714287], [1.2, 6.371428571428572], [1.2, 6.25], [1.2, 6.182142857142857], [1.2, 6.1], [1.2, 5.992857142857144], [1.2, 5.803571428571429], [1.2, 5.614285714285714], [1.2, 5.425000000000001], [1.2, 5.235714285714286], [1.2, 5.046428571428573], [1.2, 4.857142857142858], [1.2, 4.667857142857143], [1.2, 4.4785714285714295], [1.2, 4.289285714285715], [1.2, 4.1000000000000005], [1.2, 3.9107142857142865], [1.2, 3.7214285714285715], [1.2, 3.5321428571428575], [1.2, 3.3428571428571434], [1.2, 3.1535714285714294], [1.2, 2.9642857142857144], [1.2, 2.7750000000000004], [1.2, 2.5857142857142863], [1.2, 2.3964285714285714], [1.2, 2.2071428571428573], [1.2, 2.0178571428571432], [1.2, 1.8285714285714292], [1.2, 1.6392857142857142], [1.2, 1.4500000000000002], [1.2, 1.2607142857142861], [1.2, 1.071428571428572], [1.2, 0.8821428571428571], [1.2, 0.6928571428571431], [1.2, 0.503571428571429], [1.2, 0.31428571428571495], [1.2, 0.12500000000000044], [1.2, 0], [1.2, -0.06428571428571406], [1.2, -0.2535714285714281], [1.2, -0.4428571428571426], [1.2, -0.6321428571428567], [1.2, -0.8214285714285712], [1.2, -1.0107142857142852], [1.2, -1.1999999999999997], [1.2, -1.3892857142857138], [1.2, -1.5785714285714283], [1.2, -1.7678571428571423], [1.2, -1.9571428571428569], [1.2, -2.1464285714285714], [1.2, -2.3357142857142854], [1.2, -2.5249999999999995], [1.2, -2.714285714285714], [1.2, -2.9035714285714285], [1.2, -3.0928571428571425], [1.2, -3.2821428571428566], [1.2, -3.471428571428571], [1.2, -3.6607142857142856], [1.2, -3.8499999999999996]]);
																							}
																						}
																						translate(v = [0, -3.8, -0.1]) {
																							cylinder(h = 5.2, r = 1.2249999999999999);
																						}
																					}
																				}
																			}
																		}
																		translate(v = [0, 0, 0]) {
																			rotate(a = [0, 0, 0]) {
																				difference() {
																					union() {
																						translate(v = [-5.5, -12.0, 4.95]) {
																							cube(size = [11.0, 6.5, 2.05]);
																						}
																					}
																					union();
																				}
																			}
																		}
																		translate(v = [-5.5, -12.0, 4.95]) {
																			cube(size = [2.0500000000000003, 12.0, 2.05]);
																		}
																		translate(v = [3.4499999999999997, -12.0, 4.95]) {
																			cube(size = [2.0500000000000003, 12.0, 2.05]);
																		}
																	}
																	union();
																}
															}
														}
													}
													union();
												}
											}
										}
										translate(v = [-2.5, -196.8, 7.5]) {
											cube(size = [8.0, 196.6, 3.0]);
										}
										translate(v = [-2.5, -100.0, 10.45]) {
											cube(size = [12.0, 3.0, 6.05]);
										}
									}
									union() {
										translate(v = [-4.600000000500003, 0.1, 10.5]) {
											rotate(a = [90, 0, 0]) {
												cylinder(h = 16.2, r = 1.8);
											}
										}
										translate(v = [-4.600000000500003, -12.0, 10.5]) {
											rotate(a = [90, 0, 0]) {
												cylinder(h = 3.2, r = 3.5235);
											}
										}
										translate(v = [4.600000000500003, 0.1, 10.5]) {
											rotate(a = [90, 0, 0]) {
												cylinder(h = 16.2, r = 1.8);
											}
										}
										translate(v = [4.600000000500003, -12.0, 10.5]) {
											rotate(a = [90, 0, 0]) {
												cylinder(h = 3.2, r = 3.5235);
											}
										}
										translate(v = [-4.600000000500003, -197.1, 10.5]) {
											rotate(a = [-90, 0, 0]) {
												cylinder(h = 16.2, r = 1.8);
											}
										}
										translate(v = [-4.600000000500003, -185.0, 10.5]) {
											rotate(a = [-90, 0, 0]) {
												cylinder(h = 3.2, r = 3.5235);
											}
										}
										translate(v = [4.600000000500003, -197.1, 10.5]) {
											rotate(a = [-90, 0, 0]) {
												cylinder(h = 16.2, r = 1.8);
											}
										}
										translate(v = [4.600000000500003, -185.0, 10.5]) {
											rotate(a = [-90, 0, 0]) {
												cylinder(h = 3.2, r = 3.5235);
											}
										}
									}
								}
							}
						}
					}
					union();
				}
			}
		}
	}
	union();
}
